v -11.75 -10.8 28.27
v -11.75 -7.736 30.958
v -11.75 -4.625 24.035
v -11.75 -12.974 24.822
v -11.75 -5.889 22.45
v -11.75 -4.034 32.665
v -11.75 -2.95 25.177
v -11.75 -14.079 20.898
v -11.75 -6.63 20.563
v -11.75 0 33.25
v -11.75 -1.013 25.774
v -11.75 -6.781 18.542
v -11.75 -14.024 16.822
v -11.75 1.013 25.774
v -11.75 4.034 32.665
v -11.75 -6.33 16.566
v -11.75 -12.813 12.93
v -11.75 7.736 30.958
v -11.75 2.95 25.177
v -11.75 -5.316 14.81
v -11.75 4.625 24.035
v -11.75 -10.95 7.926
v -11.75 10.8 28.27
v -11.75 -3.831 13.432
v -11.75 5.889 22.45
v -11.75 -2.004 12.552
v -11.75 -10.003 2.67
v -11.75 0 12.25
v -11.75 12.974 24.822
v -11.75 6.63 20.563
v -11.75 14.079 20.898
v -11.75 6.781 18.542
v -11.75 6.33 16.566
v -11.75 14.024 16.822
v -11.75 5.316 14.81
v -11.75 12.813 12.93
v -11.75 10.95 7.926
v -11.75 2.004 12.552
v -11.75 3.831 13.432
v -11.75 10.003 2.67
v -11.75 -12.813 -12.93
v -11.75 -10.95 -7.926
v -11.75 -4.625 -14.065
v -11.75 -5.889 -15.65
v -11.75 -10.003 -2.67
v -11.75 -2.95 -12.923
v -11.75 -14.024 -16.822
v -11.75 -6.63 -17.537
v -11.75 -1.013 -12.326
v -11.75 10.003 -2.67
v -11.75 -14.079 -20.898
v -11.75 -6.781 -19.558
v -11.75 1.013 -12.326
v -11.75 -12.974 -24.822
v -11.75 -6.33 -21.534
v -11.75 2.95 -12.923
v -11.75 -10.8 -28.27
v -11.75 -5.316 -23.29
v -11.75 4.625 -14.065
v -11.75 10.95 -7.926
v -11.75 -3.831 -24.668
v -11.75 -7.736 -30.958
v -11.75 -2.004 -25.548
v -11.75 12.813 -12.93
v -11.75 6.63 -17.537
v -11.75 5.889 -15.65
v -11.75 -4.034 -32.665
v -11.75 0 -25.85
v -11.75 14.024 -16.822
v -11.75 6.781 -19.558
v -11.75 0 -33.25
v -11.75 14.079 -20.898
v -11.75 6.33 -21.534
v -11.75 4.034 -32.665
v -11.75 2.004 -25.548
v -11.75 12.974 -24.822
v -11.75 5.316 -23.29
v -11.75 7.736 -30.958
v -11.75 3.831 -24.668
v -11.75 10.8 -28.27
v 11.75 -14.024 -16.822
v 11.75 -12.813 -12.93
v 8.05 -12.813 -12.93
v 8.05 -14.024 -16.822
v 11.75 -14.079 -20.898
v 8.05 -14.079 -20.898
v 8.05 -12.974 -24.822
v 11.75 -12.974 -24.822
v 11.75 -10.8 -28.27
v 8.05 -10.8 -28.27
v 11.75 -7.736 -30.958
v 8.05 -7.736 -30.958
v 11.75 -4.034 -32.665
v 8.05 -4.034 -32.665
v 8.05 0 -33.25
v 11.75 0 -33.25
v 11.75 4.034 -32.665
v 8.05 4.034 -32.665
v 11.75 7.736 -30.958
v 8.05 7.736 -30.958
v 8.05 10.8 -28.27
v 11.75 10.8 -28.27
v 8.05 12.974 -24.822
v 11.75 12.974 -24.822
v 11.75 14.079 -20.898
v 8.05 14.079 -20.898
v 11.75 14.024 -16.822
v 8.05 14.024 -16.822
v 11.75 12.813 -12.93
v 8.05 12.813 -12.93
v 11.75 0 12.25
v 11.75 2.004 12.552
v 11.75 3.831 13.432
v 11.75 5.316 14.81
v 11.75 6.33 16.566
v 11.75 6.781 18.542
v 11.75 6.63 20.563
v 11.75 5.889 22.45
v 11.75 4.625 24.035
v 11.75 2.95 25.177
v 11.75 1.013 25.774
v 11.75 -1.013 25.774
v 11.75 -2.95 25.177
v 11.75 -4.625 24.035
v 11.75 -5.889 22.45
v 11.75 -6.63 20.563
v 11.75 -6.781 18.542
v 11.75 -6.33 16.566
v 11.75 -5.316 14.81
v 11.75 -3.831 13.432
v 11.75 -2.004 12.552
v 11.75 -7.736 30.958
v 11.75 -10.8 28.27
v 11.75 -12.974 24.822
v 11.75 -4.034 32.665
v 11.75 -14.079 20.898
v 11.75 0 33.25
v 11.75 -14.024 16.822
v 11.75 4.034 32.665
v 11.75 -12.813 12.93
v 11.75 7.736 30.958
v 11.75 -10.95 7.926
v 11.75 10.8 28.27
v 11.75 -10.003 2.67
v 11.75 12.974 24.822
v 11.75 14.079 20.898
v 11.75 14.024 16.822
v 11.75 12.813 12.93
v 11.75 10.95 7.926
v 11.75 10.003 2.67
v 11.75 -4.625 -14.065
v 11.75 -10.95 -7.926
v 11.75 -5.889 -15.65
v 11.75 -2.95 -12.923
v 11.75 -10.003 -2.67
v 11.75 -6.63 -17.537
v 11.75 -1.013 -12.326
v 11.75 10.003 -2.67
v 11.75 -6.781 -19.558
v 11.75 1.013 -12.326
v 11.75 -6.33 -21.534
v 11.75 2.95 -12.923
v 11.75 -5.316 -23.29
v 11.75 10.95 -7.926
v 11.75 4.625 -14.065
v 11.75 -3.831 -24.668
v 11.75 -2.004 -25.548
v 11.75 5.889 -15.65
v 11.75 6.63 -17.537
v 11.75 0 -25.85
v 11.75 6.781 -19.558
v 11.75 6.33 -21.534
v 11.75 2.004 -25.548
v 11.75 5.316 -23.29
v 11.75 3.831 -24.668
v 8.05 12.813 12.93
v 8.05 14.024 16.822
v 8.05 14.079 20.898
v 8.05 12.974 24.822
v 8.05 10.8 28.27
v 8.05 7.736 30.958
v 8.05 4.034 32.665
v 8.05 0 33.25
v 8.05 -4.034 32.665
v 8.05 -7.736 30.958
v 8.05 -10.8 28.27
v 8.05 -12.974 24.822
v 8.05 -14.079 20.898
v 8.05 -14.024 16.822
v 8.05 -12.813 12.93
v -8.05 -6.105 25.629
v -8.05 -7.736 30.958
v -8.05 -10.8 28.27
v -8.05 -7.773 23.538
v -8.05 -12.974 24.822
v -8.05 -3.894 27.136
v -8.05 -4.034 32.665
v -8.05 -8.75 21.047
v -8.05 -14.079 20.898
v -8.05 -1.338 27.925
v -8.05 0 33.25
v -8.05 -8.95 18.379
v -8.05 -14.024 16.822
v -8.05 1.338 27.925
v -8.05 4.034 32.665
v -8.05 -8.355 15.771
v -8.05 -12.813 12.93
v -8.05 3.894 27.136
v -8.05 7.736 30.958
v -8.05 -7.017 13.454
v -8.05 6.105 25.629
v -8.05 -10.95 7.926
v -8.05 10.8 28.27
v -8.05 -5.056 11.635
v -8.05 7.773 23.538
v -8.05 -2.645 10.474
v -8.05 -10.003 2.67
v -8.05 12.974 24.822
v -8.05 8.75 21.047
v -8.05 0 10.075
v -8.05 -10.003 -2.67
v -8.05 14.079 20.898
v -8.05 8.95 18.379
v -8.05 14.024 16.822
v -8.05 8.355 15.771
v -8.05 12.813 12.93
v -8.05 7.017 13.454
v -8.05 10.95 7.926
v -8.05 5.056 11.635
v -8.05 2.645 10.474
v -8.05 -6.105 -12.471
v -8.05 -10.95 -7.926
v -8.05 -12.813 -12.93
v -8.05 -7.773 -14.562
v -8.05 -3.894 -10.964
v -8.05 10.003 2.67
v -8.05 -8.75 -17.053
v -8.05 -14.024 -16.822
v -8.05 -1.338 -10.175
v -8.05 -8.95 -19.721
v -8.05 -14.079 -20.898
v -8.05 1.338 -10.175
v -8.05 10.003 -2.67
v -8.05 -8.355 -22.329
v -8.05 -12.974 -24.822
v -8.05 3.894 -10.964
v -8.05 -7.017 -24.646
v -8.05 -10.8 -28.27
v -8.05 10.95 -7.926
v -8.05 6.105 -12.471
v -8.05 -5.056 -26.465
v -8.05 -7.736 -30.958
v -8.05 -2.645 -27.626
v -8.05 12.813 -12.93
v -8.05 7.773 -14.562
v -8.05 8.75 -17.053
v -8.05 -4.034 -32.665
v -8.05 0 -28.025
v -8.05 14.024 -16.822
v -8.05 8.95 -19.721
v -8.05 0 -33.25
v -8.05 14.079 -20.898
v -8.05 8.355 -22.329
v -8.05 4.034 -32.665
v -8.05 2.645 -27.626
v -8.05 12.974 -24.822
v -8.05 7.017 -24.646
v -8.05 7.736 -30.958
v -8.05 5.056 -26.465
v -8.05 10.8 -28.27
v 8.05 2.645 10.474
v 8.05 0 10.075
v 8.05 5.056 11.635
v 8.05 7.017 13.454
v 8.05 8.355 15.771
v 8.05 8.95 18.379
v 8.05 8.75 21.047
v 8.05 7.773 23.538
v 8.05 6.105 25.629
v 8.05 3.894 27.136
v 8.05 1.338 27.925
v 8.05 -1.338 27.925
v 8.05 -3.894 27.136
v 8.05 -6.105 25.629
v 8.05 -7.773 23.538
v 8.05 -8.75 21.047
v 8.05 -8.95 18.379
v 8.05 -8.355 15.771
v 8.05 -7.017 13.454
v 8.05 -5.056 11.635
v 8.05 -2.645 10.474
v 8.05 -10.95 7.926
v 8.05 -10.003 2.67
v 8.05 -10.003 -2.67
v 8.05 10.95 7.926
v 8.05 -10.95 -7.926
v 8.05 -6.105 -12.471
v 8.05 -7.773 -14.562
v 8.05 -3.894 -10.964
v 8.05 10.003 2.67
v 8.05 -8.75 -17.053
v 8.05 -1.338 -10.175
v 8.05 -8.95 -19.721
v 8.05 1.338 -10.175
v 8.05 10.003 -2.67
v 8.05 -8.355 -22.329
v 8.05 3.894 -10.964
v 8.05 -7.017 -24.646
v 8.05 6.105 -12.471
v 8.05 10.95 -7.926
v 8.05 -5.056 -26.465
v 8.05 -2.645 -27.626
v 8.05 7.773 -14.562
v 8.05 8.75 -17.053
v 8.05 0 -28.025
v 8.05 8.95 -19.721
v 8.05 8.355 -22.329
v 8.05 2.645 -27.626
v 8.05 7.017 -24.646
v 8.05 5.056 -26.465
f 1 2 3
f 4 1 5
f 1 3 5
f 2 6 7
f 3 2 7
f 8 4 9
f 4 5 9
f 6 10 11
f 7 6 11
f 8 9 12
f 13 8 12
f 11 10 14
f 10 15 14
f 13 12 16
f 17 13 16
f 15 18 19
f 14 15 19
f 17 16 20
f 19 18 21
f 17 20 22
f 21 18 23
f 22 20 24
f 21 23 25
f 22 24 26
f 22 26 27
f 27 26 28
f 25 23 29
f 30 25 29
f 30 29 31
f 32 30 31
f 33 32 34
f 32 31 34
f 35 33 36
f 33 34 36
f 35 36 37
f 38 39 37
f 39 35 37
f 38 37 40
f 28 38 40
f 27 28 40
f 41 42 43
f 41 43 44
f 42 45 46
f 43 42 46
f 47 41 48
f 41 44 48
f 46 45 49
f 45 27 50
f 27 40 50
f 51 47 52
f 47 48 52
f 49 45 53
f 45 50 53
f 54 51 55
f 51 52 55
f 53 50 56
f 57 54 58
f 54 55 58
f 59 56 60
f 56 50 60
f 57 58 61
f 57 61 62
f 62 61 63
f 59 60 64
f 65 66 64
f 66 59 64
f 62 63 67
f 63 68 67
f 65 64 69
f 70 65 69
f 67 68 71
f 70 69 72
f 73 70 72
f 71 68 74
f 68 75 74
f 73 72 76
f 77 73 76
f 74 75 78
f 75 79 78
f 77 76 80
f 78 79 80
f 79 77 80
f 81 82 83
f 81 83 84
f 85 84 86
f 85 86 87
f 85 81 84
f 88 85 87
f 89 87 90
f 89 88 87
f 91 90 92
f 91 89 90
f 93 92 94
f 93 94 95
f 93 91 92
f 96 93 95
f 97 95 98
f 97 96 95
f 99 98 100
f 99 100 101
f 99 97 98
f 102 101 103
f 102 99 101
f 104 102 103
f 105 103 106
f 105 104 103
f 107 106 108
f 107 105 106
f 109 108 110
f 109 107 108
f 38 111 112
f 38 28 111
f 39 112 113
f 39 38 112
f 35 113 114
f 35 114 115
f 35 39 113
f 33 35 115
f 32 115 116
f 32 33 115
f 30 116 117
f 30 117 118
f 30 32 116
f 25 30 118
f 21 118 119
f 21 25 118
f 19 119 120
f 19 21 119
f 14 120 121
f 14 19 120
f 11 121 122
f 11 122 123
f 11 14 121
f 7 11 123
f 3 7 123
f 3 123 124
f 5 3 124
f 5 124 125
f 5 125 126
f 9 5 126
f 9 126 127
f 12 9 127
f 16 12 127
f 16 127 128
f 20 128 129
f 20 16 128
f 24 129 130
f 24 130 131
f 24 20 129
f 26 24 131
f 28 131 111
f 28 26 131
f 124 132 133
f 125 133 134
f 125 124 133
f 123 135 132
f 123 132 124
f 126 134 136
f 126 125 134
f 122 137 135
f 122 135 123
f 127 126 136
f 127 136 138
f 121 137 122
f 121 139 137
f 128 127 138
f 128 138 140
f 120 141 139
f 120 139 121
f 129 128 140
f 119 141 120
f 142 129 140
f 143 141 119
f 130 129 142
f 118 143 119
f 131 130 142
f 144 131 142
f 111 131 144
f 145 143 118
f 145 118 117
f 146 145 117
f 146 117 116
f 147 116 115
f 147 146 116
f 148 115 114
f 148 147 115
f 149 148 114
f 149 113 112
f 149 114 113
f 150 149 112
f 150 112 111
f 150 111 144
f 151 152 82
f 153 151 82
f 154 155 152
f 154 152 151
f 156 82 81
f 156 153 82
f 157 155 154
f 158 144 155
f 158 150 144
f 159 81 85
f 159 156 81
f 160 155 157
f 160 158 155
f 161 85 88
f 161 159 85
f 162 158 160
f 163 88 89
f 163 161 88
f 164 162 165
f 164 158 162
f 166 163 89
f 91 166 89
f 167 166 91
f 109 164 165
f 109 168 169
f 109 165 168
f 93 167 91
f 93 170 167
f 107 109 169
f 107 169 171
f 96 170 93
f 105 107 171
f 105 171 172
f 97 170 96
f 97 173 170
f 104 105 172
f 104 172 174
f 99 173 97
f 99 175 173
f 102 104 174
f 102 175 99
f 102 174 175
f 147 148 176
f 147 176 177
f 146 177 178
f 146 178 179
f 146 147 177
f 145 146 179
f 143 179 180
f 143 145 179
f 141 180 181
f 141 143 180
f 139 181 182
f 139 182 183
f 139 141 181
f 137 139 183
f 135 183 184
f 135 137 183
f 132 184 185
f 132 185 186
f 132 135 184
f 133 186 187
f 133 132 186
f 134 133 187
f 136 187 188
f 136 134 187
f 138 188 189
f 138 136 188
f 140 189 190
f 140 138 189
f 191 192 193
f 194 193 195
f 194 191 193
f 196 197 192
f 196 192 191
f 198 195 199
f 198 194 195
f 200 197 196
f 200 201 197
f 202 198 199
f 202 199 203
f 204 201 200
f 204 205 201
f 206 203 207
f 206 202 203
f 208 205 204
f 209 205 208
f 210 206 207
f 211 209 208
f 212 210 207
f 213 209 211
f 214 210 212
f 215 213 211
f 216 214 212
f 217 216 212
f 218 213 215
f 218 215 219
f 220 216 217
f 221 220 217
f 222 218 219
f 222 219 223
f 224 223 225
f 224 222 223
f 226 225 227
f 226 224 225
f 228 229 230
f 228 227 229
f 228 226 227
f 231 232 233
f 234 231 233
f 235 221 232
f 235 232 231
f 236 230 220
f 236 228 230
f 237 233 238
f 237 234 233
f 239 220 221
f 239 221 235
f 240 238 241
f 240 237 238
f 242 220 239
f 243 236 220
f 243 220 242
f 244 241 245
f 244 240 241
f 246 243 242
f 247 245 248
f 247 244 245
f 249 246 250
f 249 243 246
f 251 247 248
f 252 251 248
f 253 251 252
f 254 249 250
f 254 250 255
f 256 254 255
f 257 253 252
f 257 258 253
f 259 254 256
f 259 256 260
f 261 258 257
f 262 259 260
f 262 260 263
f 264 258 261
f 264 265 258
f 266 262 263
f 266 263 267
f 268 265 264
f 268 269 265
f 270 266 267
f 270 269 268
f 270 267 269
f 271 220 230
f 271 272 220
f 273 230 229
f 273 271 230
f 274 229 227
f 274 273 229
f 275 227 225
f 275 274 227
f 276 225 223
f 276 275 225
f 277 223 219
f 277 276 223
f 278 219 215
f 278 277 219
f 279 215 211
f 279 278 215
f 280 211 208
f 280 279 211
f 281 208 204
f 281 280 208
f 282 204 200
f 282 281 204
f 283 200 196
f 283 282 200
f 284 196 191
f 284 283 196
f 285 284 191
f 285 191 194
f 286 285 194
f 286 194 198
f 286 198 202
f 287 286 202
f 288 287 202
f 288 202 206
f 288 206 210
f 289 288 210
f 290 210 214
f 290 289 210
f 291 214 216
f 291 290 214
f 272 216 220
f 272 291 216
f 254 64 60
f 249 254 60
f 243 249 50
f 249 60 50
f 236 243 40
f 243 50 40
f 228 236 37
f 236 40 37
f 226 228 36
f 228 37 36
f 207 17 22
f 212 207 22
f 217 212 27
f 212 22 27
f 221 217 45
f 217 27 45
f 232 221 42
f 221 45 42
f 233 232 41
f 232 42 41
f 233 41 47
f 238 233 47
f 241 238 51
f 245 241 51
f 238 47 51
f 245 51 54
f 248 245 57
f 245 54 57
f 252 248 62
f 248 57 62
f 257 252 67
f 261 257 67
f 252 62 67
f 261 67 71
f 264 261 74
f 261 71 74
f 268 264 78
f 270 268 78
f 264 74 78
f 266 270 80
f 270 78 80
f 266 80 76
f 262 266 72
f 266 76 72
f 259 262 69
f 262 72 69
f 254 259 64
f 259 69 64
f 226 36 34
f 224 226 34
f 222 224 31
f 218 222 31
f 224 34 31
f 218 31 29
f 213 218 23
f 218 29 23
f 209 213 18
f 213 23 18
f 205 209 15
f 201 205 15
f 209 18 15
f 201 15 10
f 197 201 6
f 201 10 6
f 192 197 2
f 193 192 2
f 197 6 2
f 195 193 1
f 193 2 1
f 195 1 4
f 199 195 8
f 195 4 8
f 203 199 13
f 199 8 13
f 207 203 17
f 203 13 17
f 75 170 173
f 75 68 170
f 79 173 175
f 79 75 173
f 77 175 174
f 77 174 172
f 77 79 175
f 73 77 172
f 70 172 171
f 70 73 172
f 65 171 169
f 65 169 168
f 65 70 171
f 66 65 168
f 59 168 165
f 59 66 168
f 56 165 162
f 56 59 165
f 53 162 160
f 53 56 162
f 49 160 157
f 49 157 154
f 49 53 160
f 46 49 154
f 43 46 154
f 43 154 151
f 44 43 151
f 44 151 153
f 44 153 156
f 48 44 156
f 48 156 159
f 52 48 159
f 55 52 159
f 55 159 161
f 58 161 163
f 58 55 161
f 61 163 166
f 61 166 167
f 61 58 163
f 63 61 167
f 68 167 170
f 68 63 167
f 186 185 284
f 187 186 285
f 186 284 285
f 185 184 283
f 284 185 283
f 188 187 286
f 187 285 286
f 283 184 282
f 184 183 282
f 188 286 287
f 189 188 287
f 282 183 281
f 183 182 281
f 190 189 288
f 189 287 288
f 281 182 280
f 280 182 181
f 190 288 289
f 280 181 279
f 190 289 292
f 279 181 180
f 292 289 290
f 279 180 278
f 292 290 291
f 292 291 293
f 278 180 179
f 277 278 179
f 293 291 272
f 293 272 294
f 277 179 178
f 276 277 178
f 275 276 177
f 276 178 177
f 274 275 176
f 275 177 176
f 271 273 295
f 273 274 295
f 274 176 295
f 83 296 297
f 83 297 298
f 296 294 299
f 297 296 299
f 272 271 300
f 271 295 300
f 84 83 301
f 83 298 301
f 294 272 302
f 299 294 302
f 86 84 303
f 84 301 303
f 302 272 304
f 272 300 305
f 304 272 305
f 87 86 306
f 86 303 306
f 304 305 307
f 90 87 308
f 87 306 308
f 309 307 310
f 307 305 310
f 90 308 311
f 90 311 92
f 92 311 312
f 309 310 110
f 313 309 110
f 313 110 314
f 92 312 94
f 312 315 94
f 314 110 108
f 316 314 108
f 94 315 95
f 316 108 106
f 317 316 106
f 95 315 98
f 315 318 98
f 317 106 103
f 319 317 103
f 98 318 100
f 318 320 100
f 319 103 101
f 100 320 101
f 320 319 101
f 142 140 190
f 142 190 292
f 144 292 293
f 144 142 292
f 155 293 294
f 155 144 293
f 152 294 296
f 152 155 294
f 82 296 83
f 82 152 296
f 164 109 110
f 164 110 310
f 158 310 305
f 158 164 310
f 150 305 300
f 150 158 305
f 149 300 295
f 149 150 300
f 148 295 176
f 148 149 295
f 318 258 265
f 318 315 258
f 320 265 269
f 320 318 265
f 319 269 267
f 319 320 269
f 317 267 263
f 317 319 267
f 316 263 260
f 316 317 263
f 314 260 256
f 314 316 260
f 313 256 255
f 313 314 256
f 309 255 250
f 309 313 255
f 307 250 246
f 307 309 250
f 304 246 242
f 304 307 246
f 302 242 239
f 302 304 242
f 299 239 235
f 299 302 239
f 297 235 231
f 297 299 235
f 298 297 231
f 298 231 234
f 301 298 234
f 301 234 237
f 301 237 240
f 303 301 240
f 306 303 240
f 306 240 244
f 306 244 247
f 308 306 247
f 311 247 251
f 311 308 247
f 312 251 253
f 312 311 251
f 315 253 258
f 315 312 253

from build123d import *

# Parameters (mm, degrees)
SKETCH_1_R        = 8.975
SKETCH_1_R_2      = 6.8
EXTRUDE_1_DEPTH   = 11.75
EXTRUDE_1_2_DEPTH = 11.75
SKETCH_3_R        = 8.975
EXTRUDE_4_DEPTH   = 3.7


with BuildPart() as part:
    # Эскиз1 → Бобышка-Вытянуть1 (new, symmetric)
    with BuildSketch(Plane(origin=(0, 0, 0), x_dir=(0, 0, -1), z_dir=(1, 0, 0))):
        with Locations((-19.05, 0)):
            Circle(SKETCH_1_R)
        with Locations((-19.05, 0)):
            Circle(SKETCH_1_R_2, mode=Mode.SUBTRACT)
    extrude(amount=EXTRUDE_1_DEPTH, both=True)



with BuildPart() as body_2:
    # Эскиз1 → Extrude 1 2 (new, symmetric)
    with BuildSketch(Plane(origin=(0, 0, 0), x_dir=(0, 0, -1), z_dir=(1, 0, 0))):
        with Locations((19.05, 0)):
            Circle(SKETCH_1_R)
        with Locations((19.05, 0)):
            Circle(SKETCH_1_R_2, mode=Mode.SUBTRACT)
    extrude(amount=EXTRUDE_1_2_DEPTH, both=True)


with BuildPart() as part_1:
    add(part.part)

    add(body_2.part)  # Бобышка-Вытянуть4 merges body 2
    # Эскиз3 → Бобышка-Вытянуть4 (add)
    with BuildSketch(Plane(origin=(11.75, 0, 0), x_dir=(0, 0, -1), z_dir=(1, 0, 0))):
        with BuildLine():
            ThreePointArc((12.929864253, -12.813428052), (33.25, 0), (12.929864253, 12.813428052))
            ThreePointArc((12.929864253, 12.813428052), (0, 9.884050697), (-12.929864253, 12.813428052))
            ThreePointArc((-12.929864253, 12.813428052), (-33.25, 0), (-12.929864253, -12.813428052))
            ThreePointArc((-12.929864253, -12.813428052), (0, -9.884050697), (12.929864253, -12.813428052))
        make_face()
        with Locations((-19.05, 0)):
            Circle(SKETCH_3_R, mode=Mode.SUBTRACT)
        with Locations((19.05, 0)):
            Circle(SKETCH_3_R, mode=Mode.SUBTRACT)
    extrude_4 = extrude(amount=-EXTRUDE_4_DEPTH)

    # Зеркальное отражение10: Бобышка-Вытянуть4 across plane
    add(extrude_4.mirror(Plane(origin=(0, 0, 0), x_dir=(0, 0, 1), z_dir=(1, 0, 0))))


solid = part_1.part
